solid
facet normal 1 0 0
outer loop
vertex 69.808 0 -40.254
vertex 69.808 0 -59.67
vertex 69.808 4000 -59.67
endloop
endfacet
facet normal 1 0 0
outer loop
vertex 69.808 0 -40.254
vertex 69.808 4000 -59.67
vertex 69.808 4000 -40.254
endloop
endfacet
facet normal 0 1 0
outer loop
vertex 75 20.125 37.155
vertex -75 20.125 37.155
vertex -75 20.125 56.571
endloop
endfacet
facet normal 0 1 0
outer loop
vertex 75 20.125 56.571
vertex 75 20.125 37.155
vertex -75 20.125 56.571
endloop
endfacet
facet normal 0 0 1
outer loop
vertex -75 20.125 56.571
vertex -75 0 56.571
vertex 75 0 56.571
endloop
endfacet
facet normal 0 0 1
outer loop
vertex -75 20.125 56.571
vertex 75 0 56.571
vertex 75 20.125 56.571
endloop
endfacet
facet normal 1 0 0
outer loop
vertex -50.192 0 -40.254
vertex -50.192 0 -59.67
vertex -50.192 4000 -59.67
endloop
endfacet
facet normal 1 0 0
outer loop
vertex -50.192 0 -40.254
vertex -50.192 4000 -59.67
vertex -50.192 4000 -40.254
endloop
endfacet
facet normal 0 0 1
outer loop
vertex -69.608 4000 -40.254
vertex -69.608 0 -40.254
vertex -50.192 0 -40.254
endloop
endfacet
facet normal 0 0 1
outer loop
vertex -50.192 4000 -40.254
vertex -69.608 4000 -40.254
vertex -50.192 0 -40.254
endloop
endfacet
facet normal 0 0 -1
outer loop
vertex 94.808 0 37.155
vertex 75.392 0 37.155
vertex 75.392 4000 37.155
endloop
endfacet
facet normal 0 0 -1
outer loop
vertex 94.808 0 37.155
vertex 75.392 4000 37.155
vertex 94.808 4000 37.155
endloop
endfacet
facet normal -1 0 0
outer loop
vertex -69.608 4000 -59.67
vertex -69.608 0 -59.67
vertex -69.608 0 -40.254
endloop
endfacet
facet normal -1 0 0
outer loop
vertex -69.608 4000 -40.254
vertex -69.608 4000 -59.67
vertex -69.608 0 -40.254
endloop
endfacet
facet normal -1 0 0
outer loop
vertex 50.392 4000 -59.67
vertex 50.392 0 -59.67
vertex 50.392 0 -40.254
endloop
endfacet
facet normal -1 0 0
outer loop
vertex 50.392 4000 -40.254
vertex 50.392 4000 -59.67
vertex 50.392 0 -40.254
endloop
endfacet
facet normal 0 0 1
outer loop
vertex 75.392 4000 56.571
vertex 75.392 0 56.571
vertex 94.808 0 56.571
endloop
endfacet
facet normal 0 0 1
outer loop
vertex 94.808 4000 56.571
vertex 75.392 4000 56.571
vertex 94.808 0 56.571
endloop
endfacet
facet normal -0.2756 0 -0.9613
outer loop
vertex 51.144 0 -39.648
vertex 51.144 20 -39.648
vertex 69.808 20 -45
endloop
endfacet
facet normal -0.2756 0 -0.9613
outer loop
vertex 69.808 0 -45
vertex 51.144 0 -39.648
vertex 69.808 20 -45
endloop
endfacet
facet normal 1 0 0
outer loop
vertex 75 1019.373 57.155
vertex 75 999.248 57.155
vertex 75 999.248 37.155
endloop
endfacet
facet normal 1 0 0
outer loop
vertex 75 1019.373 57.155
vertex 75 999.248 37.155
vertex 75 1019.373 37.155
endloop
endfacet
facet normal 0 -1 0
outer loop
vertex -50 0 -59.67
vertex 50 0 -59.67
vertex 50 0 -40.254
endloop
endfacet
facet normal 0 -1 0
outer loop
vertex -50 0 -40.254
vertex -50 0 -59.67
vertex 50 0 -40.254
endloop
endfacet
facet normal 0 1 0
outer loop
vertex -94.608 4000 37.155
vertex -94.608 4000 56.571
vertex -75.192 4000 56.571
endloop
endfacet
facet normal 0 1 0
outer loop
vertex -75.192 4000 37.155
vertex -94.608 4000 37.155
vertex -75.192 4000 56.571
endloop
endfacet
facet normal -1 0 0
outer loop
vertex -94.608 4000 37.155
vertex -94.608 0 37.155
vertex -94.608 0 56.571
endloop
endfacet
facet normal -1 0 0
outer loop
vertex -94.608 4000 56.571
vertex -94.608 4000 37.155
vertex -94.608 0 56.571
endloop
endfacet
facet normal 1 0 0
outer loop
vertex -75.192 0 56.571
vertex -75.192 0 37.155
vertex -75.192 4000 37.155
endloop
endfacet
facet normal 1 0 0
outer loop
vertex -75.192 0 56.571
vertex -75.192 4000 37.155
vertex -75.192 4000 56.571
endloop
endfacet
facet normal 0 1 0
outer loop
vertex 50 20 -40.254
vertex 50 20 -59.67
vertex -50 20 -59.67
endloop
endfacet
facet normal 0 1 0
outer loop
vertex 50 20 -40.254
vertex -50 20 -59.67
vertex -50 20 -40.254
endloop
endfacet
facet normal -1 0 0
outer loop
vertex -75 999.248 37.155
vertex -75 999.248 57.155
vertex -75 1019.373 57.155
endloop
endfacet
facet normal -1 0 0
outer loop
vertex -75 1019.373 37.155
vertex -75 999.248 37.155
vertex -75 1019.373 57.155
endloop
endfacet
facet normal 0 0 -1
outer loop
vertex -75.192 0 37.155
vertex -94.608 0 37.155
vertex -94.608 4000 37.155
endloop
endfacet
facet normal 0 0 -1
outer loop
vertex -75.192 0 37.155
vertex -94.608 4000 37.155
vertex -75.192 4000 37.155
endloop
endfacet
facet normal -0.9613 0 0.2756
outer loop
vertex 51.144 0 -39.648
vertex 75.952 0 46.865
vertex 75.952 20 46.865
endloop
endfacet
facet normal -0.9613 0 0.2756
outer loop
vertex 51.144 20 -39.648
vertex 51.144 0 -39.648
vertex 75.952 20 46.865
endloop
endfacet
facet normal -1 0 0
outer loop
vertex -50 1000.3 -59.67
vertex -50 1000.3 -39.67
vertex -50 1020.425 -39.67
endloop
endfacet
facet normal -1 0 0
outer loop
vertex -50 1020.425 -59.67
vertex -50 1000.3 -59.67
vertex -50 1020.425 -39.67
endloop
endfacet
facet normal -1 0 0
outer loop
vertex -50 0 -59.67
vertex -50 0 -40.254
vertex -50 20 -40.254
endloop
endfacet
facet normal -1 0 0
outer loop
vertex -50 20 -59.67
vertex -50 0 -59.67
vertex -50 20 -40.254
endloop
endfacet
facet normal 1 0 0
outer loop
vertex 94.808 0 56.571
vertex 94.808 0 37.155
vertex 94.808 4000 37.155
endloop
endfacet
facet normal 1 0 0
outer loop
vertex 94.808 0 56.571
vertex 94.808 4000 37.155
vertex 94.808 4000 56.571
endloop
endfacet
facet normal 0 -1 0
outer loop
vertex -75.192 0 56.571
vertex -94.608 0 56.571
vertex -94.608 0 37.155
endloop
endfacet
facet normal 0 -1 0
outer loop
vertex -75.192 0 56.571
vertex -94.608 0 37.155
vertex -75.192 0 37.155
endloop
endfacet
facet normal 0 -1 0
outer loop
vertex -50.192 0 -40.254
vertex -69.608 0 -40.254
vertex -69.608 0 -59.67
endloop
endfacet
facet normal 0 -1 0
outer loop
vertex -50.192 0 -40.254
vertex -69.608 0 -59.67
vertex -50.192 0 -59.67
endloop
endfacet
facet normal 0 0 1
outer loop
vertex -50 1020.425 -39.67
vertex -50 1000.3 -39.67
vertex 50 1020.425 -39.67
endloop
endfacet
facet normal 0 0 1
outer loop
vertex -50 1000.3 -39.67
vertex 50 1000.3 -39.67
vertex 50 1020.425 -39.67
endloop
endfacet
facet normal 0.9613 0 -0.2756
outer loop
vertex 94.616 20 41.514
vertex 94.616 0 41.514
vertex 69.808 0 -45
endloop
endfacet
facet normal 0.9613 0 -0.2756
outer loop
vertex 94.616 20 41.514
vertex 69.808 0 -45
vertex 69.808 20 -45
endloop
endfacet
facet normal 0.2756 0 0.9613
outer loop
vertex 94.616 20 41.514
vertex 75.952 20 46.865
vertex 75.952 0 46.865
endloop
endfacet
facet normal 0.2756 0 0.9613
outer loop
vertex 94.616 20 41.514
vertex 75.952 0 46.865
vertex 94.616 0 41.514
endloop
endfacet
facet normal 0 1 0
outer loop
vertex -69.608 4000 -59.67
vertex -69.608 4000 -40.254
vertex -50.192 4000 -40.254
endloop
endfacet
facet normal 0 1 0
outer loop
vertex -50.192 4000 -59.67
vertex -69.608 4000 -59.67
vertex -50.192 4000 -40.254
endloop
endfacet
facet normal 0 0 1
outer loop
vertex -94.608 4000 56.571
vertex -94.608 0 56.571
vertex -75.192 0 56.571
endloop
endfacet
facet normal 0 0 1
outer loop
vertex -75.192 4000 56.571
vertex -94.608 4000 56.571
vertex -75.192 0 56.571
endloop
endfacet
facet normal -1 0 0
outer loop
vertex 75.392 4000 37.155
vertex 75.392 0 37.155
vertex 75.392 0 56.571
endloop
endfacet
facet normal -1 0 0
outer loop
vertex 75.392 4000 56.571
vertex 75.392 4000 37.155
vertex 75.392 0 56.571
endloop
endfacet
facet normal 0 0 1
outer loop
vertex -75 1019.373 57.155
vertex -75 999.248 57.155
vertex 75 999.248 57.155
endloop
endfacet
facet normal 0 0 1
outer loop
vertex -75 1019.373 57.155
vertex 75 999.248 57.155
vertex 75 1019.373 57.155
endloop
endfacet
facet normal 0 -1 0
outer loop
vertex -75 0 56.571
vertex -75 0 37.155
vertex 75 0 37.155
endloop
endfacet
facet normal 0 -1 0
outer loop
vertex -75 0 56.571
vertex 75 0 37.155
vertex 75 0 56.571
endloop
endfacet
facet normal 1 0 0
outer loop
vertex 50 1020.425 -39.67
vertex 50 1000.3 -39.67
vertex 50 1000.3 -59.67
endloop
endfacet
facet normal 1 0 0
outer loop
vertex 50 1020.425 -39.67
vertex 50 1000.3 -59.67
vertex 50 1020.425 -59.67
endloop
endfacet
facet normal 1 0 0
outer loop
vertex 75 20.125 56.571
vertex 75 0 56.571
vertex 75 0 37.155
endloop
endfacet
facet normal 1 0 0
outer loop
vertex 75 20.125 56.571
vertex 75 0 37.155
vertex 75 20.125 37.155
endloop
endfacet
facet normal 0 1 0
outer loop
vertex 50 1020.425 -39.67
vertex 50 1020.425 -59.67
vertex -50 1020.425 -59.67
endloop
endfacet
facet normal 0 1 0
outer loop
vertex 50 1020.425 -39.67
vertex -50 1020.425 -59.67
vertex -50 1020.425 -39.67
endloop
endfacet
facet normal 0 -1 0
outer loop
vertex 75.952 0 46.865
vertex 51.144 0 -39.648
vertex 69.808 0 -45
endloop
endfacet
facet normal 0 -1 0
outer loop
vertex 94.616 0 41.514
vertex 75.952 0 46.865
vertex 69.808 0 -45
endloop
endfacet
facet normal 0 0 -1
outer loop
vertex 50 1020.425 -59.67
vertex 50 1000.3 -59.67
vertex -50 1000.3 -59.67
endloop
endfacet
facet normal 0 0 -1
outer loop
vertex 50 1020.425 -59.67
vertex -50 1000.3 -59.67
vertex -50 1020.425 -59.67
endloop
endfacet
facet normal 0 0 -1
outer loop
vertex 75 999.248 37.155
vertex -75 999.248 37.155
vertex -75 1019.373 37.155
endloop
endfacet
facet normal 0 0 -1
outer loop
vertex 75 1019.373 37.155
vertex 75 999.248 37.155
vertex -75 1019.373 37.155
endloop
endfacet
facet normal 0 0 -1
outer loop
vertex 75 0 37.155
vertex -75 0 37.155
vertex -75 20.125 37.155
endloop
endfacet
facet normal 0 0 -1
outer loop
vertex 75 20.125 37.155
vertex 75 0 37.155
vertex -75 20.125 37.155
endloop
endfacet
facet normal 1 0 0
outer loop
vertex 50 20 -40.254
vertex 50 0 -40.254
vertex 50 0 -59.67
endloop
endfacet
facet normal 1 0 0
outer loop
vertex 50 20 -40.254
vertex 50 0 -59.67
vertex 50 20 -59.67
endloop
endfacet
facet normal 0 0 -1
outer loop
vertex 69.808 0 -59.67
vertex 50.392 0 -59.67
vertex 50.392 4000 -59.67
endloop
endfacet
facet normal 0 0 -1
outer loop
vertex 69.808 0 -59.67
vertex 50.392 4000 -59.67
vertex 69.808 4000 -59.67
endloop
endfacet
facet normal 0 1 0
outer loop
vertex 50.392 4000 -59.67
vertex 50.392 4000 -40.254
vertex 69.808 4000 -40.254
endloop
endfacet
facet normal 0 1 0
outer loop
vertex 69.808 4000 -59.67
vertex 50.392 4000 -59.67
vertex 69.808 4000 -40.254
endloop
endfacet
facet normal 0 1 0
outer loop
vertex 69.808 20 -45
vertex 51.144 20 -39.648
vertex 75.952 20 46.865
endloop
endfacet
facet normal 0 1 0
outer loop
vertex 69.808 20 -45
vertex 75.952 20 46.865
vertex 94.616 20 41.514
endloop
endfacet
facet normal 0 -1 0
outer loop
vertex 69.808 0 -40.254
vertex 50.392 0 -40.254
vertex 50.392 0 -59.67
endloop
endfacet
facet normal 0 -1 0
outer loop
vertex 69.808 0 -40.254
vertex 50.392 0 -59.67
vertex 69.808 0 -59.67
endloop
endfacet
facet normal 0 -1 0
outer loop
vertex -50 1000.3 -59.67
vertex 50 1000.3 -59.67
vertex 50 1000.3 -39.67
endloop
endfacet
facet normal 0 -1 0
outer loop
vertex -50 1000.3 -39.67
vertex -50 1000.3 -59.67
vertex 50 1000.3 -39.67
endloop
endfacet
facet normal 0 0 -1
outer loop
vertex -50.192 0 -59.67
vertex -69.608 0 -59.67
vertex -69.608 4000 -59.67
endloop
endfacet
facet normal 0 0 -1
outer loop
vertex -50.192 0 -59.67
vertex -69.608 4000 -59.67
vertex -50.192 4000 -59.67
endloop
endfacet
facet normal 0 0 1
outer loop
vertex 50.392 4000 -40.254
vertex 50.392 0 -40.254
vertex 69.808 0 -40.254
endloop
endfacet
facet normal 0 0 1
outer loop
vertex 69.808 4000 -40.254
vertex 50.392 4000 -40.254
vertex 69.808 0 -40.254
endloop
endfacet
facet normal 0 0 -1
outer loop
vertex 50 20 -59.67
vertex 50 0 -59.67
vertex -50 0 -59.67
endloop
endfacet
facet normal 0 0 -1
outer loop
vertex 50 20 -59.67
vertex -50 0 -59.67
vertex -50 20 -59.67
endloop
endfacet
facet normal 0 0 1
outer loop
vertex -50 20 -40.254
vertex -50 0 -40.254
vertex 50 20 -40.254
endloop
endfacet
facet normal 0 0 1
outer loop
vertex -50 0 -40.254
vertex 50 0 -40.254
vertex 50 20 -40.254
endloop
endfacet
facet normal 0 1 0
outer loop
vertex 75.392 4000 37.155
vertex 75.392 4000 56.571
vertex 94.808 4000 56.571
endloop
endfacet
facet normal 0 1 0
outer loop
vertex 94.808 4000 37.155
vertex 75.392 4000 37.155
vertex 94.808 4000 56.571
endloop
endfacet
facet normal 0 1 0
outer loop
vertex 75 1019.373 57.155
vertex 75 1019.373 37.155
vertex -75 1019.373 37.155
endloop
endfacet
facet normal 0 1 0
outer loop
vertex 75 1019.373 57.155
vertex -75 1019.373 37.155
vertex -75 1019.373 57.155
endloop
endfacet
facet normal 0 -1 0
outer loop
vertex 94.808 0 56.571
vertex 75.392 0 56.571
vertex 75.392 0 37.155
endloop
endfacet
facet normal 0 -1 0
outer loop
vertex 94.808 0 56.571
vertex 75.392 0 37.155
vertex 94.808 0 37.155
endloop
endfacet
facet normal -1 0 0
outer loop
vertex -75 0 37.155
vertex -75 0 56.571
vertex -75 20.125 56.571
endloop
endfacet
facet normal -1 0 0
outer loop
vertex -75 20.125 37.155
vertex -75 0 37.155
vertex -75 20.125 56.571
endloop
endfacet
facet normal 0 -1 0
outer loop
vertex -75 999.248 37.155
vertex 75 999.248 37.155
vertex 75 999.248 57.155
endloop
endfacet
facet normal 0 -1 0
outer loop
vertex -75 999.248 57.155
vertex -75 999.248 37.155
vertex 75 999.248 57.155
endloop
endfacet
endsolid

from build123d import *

# Parameters (mm, degrees)
F0_W     = 19.4161848675
F0_H     = 19.4161848675
F3_DEPTH = 4000
F1_W     = 20.1251437166
F1_H     = 19.4161848675
F4_DEPTH = 75
F1_W_2   = 20
F5_DEPTH = 50
F1_H_2   = 20
F6_DEPTH = 75
F7_DEPTH = 50
F2_W     = 19.4161848675
F2_H     = 20
F8_DEPTH = 45
F9_ANGLE = 16


with BuildPart() as f3:
    # F0 (on Front) → F3 (new body)
    with BuildSketch(Plane.XZ):
        with Locations((-84.8998599139, 46.86281751)):
            Rectangle(F0_W, F0_H)
    extrude(amount=-F3_DEPTH)


with BuildPart() as f3b:
    # F0 (on Front) → F3, piece 2 (new body)
    with BuildSketch(Plane.XZ):
        with Locations((85.1001400861, 46.86281751)):
            Rectangle(F0_W, F0_H)
    extrude(amount=-F3_DEPTH)


with BuildPart() as f3c:
    # F0 (on Front) → F3, piece 3 (new body)
    with BuildSketch(Plane.XZ):
        with Locations((60.1001400861, -49.9617661451)):
            Rectangle(F0_W, F0_H)
    extrude(amount=-F3_DEPTH)


with BuildPart() as f3d:
    # F0 (on Front) → F3, piece 4 (new body)
    with BuildSketch(Plane.XZ):
        with Locations((-59.8998599139, -49.9617661451)):
            Rectangle(F0_W, F0_H)
    extrude(amount=-F3_DEPTH)


with BuildPart() as f4:
    # F1 (on Right) → F4 (new body, symmetric)
    with BuildSketch(Plane.YZ):
        with Locations((10.0625718583, 46.86281751)):
            Rectangle(F1_W, F1_H)
    extrude(amount=F4_DEPTH, both=True)


with BuildPart() as f5:
    # F1 (on Right) → F5 (new body, symmetric)
    with BuildSketch(Plane.YZ):
        with Locations((10, -49.9617661451)):
            Rectangle(F1_W_2, F1_H)
    extrude(amount=F5_DEPTH, both=True)


with BuildPart() as f6:
    # F1 (on Right) → F6 (new body, symmetric)
    with BuildSketch(Plane.YZ):
        with Locations((1009.3107961635, 47.1547250763)):
            Rectangle(F1_W, F1_H_2)
    extrude(amount=F6_DEPTH, both=True)


with BuildPart() as f7:
    # F1 (on Right) → F7 (new body, symmetric)
    with BuildSketch(Plane.YZ):
        with Locations((1010.3628709306, -49.6698585789)):
            Rectangle(F1_W, F1_H_2)
    extrude(amount=F7_DEPTH, both=True)


with BuildPart() as f8:
    # F2 (on Top) → F8 (new body, symmetric)
    with BuildSketch(Plane.XY):
        with Locations((60.1001400861, 10)):
            Rectangle(F2_W, F2_H)
    extrude(amount=F8_DEPTH, both=True)


with BuildPart() as f8_1:
    # F9: moved
    add(f8.part.rotate(Axis((69.8082325198, 10, -45), (0, 1, 0)), F9_ANGLE))


solid = Compound([f3.part, f3b.part, f3c.part, f3d.part, f4.part, f5.part, f6.part, f7.part, f8_1.part])
